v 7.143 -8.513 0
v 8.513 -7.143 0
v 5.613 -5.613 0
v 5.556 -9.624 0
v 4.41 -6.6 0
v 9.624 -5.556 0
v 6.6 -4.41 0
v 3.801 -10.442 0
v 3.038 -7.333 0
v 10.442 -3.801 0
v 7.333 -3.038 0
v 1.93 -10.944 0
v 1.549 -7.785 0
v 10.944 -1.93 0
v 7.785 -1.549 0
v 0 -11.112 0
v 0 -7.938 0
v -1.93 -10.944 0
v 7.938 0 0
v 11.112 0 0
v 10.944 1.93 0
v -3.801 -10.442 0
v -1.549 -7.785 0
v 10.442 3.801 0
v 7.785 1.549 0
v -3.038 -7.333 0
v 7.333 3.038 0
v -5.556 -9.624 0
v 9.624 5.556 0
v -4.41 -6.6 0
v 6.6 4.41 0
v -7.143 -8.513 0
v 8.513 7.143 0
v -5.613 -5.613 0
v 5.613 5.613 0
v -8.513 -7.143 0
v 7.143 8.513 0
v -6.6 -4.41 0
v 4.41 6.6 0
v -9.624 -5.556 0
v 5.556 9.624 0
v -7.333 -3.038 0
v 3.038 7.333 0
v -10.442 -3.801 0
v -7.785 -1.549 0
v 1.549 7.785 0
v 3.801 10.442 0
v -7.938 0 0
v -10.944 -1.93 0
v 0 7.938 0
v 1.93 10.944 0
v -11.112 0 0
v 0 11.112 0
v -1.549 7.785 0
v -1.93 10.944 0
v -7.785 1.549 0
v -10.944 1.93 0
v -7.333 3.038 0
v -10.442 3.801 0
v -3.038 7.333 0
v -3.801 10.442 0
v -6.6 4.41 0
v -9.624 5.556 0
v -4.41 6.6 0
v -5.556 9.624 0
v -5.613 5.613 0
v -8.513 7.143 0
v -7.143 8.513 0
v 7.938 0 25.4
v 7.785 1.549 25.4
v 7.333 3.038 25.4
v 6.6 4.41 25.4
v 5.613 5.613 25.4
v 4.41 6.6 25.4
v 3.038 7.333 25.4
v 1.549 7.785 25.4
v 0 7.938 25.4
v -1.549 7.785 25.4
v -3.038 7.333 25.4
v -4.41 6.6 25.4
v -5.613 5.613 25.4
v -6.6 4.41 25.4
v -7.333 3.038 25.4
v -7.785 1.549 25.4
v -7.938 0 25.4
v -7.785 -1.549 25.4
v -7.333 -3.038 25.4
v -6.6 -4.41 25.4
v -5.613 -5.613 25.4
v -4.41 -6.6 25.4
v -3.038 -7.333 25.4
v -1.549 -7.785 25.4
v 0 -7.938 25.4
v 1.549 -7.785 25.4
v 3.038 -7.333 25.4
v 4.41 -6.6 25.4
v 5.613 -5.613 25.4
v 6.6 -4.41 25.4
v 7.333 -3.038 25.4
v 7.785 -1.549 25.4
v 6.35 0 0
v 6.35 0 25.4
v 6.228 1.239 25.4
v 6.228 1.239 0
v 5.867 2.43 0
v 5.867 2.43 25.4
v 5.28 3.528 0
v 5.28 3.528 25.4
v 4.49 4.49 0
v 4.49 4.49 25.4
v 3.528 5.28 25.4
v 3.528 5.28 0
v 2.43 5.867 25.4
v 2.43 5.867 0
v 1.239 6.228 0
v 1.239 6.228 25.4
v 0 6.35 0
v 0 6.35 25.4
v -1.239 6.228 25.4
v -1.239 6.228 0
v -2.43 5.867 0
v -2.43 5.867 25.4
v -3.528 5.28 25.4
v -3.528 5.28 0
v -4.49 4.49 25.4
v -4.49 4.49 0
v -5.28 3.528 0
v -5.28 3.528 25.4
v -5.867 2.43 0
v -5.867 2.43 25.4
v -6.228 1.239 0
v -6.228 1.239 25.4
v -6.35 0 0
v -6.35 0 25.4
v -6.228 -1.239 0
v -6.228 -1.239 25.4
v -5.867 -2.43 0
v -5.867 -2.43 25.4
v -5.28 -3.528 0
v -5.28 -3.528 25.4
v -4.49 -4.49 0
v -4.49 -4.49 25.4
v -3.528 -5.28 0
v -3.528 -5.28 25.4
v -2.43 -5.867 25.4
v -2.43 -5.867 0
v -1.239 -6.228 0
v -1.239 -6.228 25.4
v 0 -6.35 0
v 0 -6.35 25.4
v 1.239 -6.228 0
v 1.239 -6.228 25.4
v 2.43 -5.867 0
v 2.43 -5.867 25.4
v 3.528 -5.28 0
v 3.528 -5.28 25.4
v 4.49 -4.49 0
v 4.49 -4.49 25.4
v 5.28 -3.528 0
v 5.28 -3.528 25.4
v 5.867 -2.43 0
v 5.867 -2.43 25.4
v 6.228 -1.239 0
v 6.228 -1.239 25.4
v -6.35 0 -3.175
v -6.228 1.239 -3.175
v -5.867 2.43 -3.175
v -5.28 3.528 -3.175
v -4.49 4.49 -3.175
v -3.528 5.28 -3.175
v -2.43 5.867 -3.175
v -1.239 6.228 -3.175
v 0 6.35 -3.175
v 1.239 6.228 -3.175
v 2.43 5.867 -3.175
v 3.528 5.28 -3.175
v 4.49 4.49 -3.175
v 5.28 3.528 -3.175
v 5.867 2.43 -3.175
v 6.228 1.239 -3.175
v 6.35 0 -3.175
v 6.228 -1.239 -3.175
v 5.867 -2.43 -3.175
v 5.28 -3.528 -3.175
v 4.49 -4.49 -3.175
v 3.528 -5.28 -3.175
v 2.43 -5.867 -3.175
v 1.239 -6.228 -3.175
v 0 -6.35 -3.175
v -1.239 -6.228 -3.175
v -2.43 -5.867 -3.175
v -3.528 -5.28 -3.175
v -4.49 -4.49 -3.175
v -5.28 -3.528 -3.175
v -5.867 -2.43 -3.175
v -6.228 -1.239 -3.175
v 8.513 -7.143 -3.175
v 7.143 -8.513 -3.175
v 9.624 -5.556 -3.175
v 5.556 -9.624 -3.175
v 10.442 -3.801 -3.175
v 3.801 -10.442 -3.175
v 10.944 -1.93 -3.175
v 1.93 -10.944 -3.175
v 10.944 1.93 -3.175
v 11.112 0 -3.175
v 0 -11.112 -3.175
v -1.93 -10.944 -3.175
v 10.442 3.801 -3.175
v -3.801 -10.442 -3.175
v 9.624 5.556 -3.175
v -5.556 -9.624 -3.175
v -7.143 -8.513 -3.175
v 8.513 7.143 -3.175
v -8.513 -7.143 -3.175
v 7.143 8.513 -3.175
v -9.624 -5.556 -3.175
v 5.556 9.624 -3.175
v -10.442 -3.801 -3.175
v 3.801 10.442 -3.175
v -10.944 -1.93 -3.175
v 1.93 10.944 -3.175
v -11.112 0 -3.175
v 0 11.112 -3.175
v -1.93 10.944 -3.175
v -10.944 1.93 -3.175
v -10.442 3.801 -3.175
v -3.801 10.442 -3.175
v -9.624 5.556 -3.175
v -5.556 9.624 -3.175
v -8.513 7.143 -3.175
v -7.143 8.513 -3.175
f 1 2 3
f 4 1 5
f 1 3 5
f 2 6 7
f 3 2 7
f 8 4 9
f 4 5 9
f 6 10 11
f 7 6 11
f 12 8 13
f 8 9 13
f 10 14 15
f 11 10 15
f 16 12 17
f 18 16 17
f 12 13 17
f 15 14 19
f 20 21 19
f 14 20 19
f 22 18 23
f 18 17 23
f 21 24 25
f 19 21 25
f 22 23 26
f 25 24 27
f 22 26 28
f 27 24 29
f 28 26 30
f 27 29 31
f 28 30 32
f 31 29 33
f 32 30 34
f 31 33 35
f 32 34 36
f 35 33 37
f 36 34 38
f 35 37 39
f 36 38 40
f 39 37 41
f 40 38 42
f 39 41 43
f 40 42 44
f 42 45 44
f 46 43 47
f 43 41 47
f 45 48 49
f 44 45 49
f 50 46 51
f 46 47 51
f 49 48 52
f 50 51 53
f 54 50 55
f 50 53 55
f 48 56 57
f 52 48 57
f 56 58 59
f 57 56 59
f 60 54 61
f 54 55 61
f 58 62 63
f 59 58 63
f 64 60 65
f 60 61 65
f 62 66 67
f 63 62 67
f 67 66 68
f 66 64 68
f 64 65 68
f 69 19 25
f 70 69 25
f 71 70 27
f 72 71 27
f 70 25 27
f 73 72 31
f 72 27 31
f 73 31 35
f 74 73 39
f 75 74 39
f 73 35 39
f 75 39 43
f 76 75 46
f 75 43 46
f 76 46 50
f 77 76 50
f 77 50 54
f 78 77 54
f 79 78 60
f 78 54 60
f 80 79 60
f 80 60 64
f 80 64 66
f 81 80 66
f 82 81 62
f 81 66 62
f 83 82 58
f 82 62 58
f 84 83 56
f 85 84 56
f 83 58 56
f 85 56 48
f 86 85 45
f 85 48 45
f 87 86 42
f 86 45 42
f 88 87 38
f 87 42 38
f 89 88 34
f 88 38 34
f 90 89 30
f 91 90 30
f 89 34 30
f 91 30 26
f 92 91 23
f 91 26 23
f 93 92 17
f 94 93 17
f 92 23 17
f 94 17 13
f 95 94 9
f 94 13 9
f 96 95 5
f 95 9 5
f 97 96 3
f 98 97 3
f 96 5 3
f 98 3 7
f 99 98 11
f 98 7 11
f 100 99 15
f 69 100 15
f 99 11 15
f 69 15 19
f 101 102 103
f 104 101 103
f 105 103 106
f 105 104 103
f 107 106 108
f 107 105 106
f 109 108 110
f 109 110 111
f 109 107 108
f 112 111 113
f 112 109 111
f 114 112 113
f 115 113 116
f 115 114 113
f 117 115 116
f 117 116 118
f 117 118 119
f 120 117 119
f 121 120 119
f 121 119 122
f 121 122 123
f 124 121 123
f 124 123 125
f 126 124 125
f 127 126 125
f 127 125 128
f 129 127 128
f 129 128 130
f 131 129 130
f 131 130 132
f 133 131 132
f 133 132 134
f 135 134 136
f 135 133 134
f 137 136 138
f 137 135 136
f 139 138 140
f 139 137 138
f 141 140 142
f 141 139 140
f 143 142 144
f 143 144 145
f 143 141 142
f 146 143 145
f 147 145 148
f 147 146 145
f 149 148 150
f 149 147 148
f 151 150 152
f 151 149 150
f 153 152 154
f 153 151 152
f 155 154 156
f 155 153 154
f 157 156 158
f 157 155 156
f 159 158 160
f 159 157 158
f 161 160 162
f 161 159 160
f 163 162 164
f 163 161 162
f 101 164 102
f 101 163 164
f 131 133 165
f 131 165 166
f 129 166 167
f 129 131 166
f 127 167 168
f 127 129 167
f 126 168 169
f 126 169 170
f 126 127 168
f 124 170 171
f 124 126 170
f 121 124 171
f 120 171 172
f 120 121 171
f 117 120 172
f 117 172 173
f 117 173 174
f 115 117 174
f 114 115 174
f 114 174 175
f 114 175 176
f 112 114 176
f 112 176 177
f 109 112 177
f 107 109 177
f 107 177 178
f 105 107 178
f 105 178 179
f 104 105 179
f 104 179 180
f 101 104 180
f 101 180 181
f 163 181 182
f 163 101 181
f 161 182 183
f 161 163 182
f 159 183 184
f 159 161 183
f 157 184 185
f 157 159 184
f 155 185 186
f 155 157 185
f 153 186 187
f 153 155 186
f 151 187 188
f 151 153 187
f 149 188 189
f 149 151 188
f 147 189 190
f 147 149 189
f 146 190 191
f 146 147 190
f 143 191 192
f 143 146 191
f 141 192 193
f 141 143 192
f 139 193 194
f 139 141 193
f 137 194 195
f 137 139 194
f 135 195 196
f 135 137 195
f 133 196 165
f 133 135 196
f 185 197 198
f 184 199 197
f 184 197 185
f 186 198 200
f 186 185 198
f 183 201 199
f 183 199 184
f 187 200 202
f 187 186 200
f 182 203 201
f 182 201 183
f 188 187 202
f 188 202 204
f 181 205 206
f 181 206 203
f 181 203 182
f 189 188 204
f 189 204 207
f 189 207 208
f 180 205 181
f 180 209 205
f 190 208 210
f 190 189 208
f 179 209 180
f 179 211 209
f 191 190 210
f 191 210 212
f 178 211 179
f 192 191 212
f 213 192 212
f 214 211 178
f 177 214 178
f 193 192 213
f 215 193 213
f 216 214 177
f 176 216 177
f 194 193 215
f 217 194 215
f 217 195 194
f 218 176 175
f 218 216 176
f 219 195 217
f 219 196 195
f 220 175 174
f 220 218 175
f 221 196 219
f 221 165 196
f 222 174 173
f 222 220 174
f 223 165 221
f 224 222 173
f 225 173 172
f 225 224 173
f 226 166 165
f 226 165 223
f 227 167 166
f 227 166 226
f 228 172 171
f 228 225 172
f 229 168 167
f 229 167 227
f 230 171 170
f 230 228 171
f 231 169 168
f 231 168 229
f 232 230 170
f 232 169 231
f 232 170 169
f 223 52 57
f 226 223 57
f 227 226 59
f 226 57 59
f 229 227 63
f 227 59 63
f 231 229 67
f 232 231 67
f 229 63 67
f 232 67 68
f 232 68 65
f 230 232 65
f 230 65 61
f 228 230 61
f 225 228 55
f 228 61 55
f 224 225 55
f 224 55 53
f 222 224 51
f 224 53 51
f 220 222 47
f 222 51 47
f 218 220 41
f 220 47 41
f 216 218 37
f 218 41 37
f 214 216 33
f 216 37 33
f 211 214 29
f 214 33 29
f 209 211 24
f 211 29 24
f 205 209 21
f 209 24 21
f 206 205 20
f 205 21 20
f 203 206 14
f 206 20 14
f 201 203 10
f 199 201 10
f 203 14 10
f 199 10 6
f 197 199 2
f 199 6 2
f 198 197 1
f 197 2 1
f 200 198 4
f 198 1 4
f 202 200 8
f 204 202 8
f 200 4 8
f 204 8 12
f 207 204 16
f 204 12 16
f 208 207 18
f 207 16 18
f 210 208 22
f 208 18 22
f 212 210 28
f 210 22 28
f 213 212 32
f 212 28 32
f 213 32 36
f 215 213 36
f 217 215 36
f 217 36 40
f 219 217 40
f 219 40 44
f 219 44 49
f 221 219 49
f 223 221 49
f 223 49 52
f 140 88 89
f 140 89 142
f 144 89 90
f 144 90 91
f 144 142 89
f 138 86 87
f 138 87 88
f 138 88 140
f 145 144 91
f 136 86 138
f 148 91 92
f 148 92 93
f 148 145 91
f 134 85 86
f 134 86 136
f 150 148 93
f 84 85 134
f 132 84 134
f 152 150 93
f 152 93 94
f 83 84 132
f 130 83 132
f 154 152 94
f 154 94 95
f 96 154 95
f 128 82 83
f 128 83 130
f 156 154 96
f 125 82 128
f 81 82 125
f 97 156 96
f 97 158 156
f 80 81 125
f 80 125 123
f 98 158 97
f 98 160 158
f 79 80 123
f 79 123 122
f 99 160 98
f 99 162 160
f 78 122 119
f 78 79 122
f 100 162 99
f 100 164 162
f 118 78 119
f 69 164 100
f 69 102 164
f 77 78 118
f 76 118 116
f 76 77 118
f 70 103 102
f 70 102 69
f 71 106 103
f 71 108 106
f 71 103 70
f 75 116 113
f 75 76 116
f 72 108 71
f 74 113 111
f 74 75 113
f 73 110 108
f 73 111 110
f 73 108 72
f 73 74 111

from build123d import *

# Parameters (mm, degrees)
SKETCH1_R           = 7.9375
SKETCH1_R_2         = 6.35
BOSS_EXTRUDE1_DEPTH = 25.4
SKETCH2_R           = 11.1125
SKETCH2_R_2         = 6.35
BOSS_EXTRUDE2_DEPTH = 3.175


with BuildPart() as part:
    # Sketch1 → Boss-Extrude1 (new body)
    with BuildSketch(Plane.XY):
        Circle(SKETCH1_R)
        Circle(SKETCH1_R_2, mode=Mode.SUBTRACT)
    extrude(amount=BOSS_EXTRUDE1_DEPTH)

    # Sketch2 → Boss-Extrude2 (add)
    with BuildSketch(Plane(origin=(0, 0, 0), x_dir=(-1, 0, 0), z_dir=(0, 0, -1))):
        Circle(SKETCH2_R)
        Circle(SKETCH2_R_2, mode=Mode.SUBTRACT)
    extrude(amount=BOSS_EXTRUDE2_DEPTH)


solid = part.part
